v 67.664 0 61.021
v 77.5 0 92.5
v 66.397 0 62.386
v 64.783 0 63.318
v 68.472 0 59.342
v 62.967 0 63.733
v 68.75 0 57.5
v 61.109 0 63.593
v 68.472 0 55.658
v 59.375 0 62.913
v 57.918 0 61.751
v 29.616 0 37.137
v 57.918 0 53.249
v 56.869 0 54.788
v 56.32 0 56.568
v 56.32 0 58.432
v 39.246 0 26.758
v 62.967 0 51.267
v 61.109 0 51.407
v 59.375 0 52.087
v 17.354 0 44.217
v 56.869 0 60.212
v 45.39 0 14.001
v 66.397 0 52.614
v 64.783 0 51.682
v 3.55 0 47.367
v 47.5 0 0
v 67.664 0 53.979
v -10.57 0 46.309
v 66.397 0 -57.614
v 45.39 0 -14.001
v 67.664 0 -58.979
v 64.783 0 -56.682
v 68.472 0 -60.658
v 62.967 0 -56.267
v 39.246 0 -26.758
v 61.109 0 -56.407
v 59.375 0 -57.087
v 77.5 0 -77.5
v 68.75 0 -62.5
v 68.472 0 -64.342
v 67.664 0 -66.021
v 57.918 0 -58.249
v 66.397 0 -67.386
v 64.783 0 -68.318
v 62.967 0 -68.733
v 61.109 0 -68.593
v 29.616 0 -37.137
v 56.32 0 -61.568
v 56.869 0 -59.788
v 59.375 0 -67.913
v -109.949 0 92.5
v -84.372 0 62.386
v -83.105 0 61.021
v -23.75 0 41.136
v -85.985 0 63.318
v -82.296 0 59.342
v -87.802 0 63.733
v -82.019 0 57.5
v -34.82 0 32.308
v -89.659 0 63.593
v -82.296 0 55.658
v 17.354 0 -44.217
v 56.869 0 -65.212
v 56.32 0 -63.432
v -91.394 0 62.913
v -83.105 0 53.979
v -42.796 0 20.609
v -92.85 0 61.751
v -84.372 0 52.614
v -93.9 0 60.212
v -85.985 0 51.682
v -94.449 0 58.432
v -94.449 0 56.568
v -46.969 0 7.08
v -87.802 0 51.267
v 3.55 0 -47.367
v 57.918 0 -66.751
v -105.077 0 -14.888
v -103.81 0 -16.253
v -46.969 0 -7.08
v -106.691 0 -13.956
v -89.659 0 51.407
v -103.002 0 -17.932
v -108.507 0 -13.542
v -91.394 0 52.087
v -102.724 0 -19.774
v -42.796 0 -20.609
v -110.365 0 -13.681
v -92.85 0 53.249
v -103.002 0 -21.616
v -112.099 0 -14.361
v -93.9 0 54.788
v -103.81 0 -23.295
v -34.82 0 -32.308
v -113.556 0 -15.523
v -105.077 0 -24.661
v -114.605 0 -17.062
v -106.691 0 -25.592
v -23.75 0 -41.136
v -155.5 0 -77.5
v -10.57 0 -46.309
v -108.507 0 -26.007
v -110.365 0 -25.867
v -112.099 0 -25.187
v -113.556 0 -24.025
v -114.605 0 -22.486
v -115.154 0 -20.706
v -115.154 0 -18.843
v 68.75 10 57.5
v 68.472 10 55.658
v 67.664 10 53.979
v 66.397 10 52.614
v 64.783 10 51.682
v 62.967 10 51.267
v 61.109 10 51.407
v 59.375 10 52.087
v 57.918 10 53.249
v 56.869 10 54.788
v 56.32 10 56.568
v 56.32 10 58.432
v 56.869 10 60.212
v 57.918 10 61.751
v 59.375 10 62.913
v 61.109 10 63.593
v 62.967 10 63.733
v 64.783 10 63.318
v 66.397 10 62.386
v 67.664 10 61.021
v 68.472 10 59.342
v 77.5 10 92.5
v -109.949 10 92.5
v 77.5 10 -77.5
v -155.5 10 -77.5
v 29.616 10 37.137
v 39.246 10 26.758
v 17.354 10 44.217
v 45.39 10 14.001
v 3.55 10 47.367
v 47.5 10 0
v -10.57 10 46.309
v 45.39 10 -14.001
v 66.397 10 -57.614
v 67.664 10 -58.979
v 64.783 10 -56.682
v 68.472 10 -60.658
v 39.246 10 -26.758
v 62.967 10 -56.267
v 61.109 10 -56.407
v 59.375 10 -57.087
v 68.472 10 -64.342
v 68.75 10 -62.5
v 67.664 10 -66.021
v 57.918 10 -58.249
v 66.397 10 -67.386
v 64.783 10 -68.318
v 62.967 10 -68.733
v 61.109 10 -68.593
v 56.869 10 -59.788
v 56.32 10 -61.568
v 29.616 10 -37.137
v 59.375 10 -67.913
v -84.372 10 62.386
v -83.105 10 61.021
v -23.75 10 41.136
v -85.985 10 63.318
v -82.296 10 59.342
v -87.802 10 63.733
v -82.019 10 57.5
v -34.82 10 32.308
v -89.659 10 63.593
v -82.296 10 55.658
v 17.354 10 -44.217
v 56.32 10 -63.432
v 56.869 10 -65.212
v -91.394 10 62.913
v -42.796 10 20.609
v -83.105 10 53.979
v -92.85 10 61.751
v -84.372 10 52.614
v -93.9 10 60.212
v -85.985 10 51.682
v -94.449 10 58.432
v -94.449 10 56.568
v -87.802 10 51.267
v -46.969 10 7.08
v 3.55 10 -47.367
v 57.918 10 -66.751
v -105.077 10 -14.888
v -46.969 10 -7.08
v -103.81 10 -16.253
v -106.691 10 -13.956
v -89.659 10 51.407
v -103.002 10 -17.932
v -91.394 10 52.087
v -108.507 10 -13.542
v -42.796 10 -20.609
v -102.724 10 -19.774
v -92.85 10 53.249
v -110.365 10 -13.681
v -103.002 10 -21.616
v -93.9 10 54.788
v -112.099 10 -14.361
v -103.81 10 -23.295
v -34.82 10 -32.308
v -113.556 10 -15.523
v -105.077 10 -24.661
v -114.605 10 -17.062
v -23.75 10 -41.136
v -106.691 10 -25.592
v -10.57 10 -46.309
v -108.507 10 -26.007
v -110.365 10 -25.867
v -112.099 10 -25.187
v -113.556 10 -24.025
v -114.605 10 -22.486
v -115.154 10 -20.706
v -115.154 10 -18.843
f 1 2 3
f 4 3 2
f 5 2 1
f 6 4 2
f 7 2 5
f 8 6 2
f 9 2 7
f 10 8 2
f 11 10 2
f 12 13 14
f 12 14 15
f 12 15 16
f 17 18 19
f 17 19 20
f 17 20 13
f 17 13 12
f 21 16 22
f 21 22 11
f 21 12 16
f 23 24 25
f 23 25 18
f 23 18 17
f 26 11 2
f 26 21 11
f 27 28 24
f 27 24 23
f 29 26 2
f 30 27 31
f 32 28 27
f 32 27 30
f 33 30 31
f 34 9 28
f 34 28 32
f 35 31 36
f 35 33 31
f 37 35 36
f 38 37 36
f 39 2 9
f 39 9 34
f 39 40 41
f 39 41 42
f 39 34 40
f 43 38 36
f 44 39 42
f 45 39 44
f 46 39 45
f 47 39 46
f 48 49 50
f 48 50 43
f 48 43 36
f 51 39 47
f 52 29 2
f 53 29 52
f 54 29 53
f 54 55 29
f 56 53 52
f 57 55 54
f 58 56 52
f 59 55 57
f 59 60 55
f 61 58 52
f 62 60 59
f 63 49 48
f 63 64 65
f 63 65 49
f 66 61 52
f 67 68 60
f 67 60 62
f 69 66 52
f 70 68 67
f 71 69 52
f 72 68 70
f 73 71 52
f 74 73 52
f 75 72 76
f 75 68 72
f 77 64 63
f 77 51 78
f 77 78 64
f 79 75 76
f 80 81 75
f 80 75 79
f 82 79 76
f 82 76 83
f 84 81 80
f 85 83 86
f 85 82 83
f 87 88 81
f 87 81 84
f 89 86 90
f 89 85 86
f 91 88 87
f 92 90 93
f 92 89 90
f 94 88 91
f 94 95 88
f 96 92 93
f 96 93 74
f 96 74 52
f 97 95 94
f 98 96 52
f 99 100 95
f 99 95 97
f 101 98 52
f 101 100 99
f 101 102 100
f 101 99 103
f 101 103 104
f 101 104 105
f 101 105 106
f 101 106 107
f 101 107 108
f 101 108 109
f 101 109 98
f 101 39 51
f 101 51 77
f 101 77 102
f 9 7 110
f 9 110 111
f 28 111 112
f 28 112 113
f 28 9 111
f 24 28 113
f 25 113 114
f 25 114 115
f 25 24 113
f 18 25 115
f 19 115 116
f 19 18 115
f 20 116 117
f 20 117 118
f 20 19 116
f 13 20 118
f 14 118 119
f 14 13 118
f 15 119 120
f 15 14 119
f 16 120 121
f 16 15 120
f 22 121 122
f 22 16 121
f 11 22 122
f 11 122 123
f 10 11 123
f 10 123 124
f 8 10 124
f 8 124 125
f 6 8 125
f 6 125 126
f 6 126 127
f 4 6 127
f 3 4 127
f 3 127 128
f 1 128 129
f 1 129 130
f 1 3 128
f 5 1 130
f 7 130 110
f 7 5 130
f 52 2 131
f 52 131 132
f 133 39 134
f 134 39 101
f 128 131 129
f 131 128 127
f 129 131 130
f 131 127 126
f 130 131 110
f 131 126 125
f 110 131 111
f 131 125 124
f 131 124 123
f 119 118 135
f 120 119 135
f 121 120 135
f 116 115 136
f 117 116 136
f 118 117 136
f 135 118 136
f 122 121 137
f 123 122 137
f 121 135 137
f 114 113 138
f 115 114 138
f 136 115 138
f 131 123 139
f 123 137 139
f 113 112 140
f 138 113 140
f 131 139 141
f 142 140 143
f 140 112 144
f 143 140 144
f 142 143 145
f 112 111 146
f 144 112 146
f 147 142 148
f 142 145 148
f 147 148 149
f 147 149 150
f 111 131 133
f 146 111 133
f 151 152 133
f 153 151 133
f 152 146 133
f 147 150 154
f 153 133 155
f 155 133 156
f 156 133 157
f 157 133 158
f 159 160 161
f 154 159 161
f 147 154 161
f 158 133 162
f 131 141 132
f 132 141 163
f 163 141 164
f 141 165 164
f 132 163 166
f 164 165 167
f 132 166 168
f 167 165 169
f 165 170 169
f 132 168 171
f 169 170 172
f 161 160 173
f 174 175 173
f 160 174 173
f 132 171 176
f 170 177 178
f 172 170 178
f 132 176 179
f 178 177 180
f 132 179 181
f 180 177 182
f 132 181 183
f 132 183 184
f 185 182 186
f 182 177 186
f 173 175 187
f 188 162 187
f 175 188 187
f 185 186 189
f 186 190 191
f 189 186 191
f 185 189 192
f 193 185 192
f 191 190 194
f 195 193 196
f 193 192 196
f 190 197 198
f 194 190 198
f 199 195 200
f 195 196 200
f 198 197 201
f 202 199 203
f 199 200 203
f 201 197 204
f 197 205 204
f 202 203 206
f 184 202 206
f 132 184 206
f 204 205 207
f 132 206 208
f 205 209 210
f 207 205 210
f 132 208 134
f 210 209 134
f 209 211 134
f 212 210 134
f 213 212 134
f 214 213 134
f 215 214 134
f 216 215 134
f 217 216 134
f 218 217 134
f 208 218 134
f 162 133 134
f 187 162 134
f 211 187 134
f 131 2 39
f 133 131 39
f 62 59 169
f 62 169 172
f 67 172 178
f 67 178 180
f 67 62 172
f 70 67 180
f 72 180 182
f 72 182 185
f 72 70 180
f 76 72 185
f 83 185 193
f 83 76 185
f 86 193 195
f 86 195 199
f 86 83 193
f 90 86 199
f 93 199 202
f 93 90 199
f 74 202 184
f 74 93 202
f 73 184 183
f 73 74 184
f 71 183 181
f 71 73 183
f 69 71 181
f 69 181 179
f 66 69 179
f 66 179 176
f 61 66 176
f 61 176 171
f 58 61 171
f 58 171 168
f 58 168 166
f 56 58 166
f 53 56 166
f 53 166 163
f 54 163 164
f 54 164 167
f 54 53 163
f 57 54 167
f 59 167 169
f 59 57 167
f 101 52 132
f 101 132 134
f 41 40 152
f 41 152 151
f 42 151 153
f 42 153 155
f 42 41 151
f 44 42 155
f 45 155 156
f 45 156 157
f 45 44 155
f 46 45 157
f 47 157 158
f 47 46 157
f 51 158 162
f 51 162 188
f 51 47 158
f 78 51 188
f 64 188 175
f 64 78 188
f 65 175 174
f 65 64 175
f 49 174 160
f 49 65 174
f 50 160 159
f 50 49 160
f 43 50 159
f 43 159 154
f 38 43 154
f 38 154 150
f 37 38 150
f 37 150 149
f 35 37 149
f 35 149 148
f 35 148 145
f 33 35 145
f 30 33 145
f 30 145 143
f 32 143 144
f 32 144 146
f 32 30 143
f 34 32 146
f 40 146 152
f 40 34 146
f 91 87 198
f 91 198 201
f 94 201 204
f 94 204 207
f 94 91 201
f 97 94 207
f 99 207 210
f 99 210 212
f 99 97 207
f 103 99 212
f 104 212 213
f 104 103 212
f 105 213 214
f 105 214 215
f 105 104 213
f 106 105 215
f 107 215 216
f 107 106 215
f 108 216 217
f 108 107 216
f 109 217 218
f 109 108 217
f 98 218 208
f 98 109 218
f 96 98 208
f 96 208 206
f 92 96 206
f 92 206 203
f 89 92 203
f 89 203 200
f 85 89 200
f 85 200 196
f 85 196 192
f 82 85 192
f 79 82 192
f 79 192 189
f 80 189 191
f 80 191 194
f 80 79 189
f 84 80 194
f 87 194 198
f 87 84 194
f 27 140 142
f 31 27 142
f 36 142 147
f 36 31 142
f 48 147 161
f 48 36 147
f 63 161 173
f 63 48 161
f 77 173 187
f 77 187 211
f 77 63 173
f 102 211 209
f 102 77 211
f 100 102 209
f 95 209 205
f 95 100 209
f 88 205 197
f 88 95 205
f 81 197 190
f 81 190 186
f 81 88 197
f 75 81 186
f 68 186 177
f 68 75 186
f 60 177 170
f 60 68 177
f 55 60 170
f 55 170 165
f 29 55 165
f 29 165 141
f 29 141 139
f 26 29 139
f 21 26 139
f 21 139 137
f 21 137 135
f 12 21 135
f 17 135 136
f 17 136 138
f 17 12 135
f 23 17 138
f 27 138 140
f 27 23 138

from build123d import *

# Parameters (mm, degrees)
SZKIC3_R                    = 47.5
SZKIC3_R_2                  = 6.25
DODANIE_WYCI_GNI_CIE2_DEPTH = 10


with BuildPart() as part:
    # Szkic3 → Dodanie-wyciągnięcie2 (new body)
    with BuildSketch(Plane(origin=(0, 0, 0), x_dir=(1, 0, 0), z_dir=(0, 1, 0))):
        Polygon((-77.5, 77.5), (77.5, 77.5), (77.5, -77.5), (77.5, -92.5), (-109.948637287, -92.5), (-155.5, 77.5), align=None)
        Circle(SZKIC3_R, mode=Mode.SUBTRACT)
        with Locations((62.5, 62.5)):
            Circle(SZKIC3_R_2, mode=Mode.SUBTRACT)
        with Locations((62.5, -57.5)):
            Circle(SZKIC3_R_2, mode=Mode.SUBTRACT)
        with Locations((-88.268573609, -57.5)):
            Circle(SZKIC3_R_2, mode=Mode.SUBTRACT)
        with Locations((-108.974097218, 19.774066103)):
            Circle(SZKIC3_R_2, mode=Mode.SUBTRACT)
    extrude(amount=DODANIE_WYCI_GNI_CIE2_DEPTH)


solid = part.part
